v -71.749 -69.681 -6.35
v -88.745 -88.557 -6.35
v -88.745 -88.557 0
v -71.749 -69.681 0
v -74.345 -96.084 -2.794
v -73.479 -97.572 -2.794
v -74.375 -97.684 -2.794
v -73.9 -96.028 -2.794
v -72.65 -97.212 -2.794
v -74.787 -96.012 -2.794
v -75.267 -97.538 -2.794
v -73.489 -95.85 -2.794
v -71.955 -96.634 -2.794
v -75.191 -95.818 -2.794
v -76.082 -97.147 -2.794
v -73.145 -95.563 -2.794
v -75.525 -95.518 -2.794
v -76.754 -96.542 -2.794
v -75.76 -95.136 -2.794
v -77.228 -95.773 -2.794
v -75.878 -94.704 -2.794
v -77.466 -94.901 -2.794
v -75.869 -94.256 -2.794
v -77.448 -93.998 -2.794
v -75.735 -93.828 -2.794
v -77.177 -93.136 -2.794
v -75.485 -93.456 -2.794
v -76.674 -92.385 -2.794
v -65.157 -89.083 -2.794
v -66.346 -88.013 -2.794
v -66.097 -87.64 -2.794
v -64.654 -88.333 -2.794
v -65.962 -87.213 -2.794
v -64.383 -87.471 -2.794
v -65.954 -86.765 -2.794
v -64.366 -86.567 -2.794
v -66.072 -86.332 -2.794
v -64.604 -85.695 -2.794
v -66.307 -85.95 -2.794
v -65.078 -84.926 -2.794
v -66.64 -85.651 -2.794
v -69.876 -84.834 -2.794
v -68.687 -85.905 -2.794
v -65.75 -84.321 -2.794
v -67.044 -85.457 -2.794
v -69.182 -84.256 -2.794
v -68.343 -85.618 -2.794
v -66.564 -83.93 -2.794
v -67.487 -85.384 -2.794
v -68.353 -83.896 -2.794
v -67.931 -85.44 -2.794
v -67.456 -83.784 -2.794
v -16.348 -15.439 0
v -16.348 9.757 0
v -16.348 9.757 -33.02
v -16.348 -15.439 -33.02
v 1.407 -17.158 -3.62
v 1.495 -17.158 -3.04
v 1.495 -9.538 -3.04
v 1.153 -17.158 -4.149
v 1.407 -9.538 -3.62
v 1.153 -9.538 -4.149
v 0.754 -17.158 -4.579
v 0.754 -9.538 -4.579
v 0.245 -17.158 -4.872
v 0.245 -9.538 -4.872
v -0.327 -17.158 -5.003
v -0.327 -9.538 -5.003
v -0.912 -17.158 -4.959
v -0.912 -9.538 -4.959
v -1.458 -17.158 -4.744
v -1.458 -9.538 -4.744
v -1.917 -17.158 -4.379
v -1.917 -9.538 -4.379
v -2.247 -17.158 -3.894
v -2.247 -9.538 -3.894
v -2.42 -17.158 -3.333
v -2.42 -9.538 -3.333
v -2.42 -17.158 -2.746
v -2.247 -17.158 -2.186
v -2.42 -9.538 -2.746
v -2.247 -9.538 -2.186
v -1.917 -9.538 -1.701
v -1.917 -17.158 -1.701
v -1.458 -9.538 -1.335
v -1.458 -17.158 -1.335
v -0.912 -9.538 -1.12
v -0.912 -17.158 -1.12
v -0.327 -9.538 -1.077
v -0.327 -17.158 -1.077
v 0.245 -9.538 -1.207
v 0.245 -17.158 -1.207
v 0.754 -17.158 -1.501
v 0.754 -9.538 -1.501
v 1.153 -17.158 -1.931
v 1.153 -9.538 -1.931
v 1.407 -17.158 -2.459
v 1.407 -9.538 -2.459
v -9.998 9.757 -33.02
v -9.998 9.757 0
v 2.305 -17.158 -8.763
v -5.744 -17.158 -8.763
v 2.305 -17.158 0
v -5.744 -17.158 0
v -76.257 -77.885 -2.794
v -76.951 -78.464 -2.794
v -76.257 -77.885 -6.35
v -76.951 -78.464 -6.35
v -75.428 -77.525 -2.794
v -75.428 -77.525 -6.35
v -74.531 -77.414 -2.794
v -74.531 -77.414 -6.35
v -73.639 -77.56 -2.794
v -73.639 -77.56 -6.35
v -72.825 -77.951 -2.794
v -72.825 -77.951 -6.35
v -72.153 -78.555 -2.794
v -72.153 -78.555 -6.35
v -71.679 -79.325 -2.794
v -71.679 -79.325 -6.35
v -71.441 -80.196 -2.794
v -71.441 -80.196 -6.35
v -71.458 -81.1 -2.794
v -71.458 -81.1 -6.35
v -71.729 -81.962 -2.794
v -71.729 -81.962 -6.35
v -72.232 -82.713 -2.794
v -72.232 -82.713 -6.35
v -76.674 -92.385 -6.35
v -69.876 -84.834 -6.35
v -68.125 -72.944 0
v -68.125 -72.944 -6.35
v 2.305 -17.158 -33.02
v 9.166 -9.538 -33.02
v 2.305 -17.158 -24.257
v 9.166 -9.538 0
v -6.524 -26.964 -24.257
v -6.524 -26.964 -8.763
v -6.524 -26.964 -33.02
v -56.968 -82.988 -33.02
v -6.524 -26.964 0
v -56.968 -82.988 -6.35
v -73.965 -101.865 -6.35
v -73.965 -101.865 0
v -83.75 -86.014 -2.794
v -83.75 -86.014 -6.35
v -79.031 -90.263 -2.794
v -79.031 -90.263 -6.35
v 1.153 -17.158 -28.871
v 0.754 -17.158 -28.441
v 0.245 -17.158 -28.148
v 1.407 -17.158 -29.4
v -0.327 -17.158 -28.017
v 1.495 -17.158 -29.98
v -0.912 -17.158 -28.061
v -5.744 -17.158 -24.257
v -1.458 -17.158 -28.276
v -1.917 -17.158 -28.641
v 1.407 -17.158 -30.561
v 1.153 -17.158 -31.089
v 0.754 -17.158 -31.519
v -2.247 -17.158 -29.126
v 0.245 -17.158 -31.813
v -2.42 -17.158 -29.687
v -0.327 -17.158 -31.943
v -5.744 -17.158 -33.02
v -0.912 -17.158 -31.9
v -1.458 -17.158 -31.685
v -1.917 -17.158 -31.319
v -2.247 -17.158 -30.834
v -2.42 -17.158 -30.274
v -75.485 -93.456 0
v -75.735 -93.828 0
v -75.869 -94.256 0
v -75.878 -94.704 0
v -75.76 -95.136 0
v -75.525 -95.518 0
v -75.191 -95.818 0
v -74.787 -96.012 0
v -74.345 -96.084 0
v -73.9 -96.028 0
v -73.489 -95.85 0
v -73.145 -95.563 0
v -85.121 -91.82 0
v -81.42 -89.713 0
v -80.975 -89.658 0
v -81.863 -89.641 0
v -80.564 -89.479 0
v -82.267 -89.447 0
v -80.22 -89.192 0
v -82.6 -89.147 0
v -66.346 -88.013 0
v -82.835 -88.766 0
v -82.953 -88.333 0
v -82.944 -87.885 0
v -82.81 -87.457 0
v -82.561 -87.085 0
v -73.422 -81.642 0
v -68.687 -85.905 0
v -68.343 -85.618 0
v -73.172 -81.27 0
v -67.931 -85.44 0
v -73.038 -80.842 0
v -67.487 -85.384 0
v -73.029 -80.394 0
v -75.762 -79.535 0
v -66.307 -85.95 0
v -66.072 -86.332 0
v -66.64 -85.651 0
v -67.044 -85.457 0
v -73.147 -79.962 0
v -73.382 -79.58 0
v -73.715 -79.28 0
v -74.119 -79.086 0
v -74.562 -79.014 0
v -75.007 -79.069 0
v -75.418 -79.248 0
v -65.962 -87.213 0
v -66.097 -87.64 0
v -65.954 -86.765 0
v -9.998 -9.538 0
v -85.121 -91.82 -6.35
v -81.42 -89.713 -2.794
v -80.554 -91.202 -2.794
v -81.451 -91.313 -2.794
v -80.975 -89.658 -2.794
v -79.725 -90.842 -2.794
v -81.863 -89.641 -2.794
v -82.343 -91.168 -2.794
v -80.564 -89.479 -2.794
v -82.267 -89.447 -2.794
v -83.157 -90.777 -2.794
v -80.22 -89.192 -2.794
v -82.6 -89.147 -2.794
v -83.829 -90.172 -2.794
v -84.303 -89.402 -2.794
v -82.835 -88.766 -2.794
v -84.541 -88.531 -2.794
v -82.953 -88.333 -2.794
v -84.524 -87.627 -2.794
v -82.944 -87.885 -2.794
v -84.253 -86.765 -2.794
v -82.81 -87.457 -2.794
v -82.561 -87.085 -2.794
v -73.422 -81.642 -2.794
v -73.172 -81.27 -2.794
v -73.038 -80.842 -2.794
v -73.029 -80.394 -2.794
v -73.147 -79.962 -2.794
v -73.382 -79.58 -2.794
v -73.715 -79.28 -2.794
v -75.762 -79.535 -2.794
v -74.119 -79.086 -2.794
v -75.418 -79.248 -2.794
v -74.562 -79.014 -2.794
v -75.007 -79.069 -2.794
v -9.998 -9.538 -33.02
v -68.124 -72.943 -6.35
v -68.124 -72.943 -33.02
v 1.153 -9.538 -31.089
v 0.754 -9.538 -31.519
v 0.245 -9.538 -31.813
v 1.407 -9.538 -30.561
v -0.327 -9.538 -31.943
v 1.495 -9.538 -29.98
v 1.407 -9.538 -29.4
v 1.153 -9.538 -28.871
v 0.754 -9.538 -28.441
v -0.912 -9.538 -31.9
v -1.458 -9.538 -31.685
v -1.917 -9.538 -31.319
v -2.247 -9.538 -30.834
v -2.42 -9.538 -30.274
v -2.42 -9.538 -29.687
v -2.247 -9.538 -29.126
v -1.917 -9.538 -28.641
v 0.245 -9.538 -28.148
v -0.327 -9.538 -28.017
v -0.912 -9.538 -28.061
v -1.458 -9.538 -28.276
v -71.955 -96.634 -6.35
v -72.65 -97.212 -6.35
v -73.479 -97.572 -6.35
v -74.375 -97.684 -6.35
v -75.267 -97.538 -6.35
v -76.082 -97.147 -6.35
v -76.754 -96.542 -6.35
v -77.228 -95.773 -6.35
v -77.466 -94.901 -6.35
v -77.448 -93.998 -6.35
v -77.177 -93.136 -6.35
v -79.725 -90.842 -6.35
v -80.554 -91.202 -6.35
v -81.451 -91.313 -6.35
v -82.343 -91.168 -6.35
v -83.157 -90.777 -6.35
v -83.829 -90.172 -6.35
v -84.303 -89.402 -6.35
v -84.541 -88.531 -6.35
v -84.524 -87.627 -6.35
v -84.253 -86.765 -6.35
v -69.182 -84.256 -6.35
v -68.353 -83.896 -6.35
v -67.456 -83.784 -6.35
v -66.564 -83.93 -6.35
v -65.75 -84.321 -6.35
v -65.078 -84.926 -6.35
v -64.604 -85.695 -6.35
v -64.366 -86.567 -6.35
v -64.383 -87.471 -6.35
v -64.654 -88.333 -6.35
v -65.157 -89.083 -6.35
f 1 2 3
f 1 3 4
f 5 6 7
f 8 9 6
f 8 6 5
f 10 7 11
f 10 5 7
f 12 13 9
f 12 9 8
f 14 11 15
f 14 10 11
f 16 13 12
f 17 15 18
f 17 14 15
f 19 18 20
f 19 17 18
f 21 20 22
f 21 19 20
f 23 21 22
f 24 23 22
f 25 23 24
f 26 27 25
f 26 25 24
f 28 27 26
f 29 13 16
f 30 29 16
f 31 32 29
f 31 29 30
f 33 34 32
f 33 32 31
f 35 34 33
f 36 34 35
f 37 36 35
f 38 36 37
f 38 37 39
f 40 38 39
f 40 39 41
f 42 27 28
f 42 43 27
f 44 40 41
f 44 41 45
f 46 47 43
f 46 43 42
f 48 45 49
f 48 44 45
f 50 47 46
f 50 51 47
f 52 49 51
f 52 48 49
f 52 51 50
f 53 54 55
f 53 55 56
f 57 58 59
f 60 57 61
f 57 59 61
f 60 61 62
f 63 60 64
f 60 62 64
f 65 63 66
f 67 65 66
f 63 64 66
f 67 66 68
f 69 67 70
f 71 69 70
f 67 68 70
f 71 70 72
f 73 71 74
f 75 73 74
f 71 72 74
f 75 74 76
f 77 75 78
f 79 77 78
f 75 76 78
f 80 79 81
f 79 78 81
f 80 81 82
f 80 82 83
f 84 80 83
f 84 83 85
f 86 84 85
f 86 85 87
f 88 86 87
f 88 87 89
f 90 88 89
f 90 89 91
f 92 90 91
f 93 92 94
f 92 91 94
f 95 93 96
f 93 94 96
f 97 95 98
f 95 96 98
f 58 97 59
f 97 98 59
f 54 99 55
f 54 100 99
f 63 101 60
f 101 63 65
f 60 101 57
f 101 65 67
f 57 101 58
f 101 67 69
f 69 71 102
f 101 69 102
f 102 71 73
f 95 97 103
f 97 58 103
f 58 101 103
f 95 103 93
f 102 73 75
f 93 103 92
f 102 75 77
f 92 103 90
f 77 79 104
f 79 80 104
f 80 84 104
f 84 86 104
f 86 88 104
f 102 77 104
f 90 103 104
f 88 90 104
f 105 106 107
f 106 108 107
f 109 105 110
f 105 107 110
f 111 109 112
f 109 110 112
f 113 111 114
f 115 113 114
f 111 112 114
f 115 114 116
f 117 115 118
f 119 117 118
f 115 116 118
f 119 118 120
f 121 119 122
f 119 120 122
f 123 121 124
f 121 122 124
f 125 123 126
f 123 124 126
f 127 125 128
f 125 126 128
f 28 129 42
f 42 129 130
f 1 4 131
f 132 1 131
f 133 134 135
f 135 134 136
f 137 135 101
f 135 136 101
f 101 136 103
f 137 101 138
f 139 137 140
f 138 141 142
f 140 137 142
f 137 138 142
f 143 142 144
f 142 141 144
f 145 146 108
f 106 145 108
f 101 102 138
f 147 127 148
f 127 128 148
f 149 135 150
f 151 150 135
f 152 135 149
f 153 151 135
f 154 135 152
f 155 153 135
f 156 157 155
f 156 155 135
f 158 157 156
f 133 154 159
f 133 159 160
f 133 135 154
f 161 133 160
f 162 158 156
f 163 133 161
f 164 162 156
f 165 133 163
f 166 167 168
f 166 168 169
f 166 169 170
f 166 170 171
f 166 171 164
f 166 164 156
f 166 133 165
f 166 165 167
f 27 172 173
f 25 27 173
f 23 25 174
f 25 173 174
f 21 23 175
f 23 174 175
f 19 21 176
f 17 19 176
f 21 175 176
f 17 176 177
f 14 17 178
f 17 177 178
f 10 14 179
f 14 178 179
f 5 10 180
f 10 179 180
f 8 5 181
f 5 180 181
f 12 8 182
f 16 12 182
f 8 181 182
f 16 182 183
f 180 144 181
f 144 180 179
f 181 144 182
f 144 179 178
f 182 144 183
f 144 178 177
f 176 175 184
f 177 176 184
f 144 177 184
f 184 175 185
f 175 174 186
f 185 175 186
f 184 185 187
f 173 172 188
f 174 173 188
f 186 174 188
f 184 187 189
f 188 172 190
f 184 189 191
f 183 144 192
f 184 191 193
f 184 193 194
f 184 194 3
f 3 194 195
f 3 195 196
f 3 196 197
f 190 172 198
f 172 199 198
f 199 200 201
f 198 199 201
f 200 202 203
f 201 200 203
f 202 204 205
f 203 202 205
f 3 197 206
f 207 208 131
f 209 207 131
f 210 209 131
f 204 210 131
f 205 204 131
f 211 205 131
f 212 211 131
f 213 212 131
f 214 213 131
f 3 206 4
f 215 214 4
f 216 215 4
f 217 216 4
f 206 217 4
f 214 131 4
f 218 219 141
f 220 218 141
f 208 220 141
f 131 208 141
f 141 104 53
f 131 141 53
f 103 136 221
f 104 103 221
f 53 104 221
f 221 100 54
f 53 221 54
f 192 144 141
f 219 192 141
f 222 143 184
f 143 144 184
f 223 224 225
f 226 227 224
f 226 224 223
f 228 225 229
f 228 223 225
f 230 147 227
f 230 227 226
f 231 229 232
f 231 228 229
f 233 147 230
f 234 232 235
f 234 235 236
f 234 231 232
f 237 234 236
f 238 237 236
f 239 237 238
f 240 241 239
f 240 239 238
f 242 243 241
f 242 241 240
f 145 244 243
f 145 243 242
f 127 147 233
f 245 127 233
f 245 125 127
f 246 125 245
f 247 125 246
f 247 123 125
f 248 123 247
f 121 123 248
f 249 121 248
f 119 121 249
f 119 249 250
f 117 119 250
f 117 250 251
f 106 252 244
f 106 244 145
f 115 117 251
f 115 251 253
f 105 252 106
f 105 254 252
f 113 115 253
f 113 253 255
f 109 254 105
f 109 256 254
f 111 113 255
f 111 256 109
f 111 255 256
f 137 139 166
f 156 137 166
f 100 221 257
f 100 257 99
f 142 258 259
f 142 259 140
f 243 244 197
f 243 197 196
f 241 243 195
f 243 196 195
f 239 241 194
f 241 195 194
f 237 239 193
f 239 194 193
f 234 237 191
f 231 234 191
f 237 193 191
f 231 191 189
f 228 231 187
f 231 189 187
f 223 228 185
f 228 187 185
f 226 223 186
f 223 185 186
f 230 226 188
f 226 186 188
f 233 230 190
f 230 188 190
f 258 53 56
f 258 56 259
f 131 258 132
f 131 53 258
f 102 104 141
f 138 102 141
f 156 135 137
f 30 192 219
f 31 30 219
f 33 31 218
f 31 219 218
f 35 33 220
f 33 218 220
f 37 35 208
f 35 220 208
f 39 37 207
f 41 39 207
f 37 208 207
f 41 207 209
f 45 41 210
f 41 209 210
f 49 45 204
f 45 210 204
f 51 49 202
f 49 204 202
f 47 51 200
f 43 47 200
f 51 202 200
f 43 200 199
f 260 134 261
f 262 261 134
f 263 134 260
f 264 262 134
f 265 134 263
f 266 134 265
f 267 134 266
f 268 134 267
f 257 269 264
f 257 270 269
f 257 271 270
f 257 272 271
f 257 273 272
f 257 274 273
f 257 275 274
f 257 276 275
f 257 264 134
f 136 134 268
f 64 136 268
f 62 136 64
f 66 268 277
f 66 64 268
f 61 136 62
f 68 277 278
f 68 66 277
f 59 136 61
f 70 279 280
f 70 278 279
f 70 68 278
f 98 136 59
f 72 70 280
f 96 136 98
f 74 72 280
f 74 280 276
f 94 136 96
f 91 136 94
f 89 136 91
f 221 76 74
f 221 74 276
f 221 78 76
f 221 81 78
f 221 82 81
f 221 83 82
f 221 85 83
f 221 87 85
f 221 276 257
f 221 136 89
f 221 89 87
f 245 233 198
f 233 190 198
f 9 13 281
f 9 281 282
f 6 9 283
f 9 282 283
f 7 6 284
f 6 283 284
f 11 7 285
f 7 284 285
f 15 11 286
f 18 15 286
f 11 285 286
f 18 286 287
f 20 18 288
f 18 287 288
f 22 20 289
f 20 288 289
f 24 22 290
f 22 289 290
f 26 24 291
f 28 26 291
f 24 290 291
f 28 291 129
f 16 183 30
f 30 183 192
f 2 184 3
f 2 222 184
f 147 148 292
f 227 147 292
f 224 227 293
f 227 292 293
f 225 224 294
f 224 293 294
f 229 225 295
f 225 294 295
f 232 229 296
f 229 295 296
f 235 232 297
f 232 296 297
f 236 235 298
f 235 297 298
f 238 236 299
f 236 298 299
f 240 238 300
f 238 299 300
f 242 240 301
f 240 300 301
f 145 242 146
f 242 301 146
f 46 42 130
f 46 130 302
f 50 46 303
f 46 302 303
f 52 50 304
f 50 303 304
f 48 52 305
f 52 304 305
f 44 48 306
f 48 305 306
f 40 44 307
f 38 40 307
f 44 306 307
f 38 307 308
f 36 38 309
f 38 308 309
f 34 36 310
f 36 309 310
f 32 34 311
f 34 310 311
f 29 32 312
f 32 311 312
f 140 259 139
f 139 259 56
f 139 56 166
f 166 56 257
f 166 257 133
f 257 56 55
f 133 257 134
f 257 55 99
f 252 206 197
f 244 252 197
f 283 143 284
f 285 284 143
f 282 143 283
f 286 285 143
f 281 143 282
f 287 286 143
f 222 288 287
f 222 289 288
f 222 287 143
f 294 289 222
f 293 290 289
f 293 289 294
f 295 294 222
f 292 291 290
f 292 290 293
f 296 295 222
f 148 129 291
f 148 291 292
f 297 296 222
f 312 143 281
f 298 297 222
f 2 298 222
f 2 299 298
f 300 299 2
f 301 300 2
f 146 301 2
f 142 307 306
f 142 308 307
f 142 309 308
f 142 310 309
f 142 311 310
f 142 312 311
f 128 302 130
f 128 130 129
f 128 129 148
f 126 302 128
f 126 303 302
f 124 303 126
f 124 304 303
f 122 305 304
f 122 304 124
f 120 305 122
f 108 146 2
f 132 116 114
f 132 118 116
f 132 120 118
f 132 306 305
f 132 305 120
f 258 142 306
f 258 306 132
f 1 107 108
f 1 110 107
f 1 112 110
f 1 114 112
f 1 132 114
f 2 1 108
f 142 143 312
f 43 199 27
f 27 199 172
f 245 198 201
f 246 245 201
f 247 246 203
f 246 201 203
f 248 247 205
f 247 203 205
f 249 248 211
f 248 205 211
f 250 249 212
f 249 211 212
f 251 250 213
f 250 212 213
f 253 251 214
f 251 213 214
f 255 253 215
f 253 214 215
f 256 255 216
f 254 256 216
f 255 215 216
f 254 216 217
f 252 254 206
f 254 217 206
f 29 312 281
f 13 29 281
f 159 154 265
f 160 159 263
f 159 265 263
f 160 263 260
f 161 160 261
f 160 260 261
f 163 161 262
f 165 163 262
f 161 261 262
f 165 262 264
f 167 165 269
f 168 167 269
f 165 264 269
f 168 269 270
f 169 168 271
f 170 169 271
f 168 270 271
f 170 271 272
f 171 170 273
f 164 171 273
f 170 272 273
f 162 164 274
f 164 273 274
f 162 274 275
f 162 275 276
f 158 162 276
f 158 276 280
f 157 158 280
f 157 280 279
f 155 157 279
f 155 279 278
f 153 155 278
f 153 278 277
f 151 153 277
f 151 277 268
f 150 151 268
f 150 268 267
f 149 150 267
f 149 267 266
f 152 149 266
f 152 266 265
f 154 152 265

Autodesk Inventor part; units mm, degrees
ref_plane "YZ Plane" through (0, 0, 0) normal (1, 0, 0) x (0, 1, 0)
ref_plane "XZ Plane" through (0, 0, 0) normal (0, 1, 0) x (-1, 0, 0)
ref_plane "Work Plane1" through (0, 0, 0) normal (0, 0, 1) x (1, 0, 0)
sketch "Sketch1" plane through (0, 0, 0) normal (0, 0, 1) x (1, 0, 0)
  line L0 (4.129202, -9.5377) -> (6.406797, -9.5377) construction
  line L1 (9.525, -8.41296) -> (9.525, -7.435497) construction
  line L2 (-6.406797, 9.5123) -> (-4.129202, 9.5123) construction
  line L3 (-9.525, 4.116502) -> (-9.525, 6.394097) construction
  line L4 (9.314549, -9.373063) -> (-73.965447, -101.864868) construction
  line L5 (9.166309, -9.5377) -> (-73.965447, -101.864868)
  line L6 (-73.965447, -101.864868) -> (-85.121243, -91.820144)
  line L7 (6.33881, 9.756536) -> (-85.121243, -91.820144) construction
  line L8 (9.166309, -9.5377) -> (-9.997679, -9.5377)
  line L9 (-9.997679, -9.5377) -> (-9.997679, 9.756536)
  line L10 (-9.997679, 9.756536) -> (-16.347679, 9.756536)
  line L11 (-16.347679, 9.756536) -> (-16.347679, -15.439362)
  line L12 (-16.347679, -15.439362) -> (-85.121243, -91.820144)
  point P0 (0, 0)
  dimension "d0" = 124.46
  dimension "d1" = 48
  dimension "d5" = 6.35
ref_plane "Work Plane2" through (-4.445, -9.144, -33.02) normal (0, 0, -1) x (0, 1, 0)
extrude "Extrusion1" add sketch "Sketch1" against normal up to surface (33.02 mm away)
sketch "Sketch2" plane through (-73.965447, -101.864868, -33.02) normal (-0.6691306, -0.7431448, 0) x (0.7431448, -0.6691306, 0)
  line L0 (0, 33.02) -> (0, 0)
  line L1 (-15.011605, 33.02) -> (-15.011605, 0)
  line L2 (0, 0) -> (-15.011605, 0)
  line L3 (-15.011605, 0) -> (-15.011605, 26.67)
  line L4 (-15.011605, 26.67) -> (0, 26.67)
  line L5 (0, 26.67) -> (0, 0)
  line L6 (-15.011605, 33.02) -> (0, 33.02)
  point P0 (-13.193862, 33.02)
  dimension "d19" = 6.35
extrude "Extrusion2" cut sketch "Sketch2" against normal blind 25.4 contours L0 L2 L1 L4
sketch "Sketch3" plane through (-73.965447, -101.864868, -6.35) normal (0, 0, -1) x (-0.7431448, 0.6691306, 0)
  line L0 (19.8882, 12.0904) -> (19.8882, 3.175) construction
  line L1 (0, 25.4) -> (15.011605, 25.4) construction
  line L2 (15.011605, 0) -> (0, 0) construction
  line L3 (0, 0) -> (19.8882, 0) construction
  line L4 (19.8882, 0) -> (19.8882, 25.4) construction
  line L5 (19.8882, 25.4) -> (0, 25.4) construction
  line L6 (0, 25.4) -> (0, 0) construction
  line L7 (15.011605, 0) -> (19.8882, 0)
  line L8 (19.8882, 0) -> (19.8882, 25.4)
  line L9 (19.8882, 25.4) -> (15.011605, 25.4)
  line L10 (15.011605, 25.4) -> (15.011605, 0)
  point P0 (13.193862, 125.192894)
extrude "Extrusion3" add sketch "Sketch3" against normal up to surface (6.35 mm away)
sketch "Sketch4" plane through (0, 0, 0) normal (0, 0, 1) x (1, 0, 0)
  line L0 (-88.74526, -88.557064) -> (-71.749342, -69.681186) construction
  line L1 (-73.965447, -101.864868) -> (9.166309, -9.5377) construction
  line L2 (-74.314967, -94.50927) -> (-67.5166, -86.958918) construction
  line L3 (-73.965447, -101.864868) -> (-56.969529, -82.988989) construction
  line L4 (-73.965447, -101.864868) -> (-88.74526, -88.557064) construction
  line L5 (-81.390199, -88.138702) -> (-74.591832, -80.588351) construction
  line L6 (-74.314967, -94.50927) -> (-67.5166, -86.958918) construction
  line L7 (-73.144662, -95.563017) -> (-66.346296, -88.012665)
  line L8 (-68.686904, -85.905171) -> (-75.485271, -93.455523)
  arc A0 (-75.485271, -93.455523) -> (-73.144662, -95.563017) centre (-74.314967, -94.50927) ccw
  arc A1 (-66.346296, -88.012665) -> (-68.686904, -85.905171) centre (-67.5166, -86.958918) ccw
  line L9 (-81.390199, -88.138702) -> (-74.591832, -80.588351) construction
  line L10 (-80.219894, -89.192449) -> (-73.421527, -81.642098)
  line L11 (-75.762136, -79.534604) -> (-82.560503, -87.084955)
  arc A2 (-82.560503, -87.084955) -> (-80.219894, -89.192449) centre (-81.390199, -88.138702) ccw
  arc A3 (-73.421527, -81.642098) -> (-75.762136, -79.534604) centre (-74.591832, -80.588351) ccw
  point P0 (0, 0)
  point P1 (-70.915783, -90.734094)
  point P2 (-77.991015, -84.363527)
  dimension "d37" = 10.16
  dimension "d38" = 5.1816
  dimension "d39" = 5.2324
  dimension "d40" = 9.52066
  dimension "d41" = 3.1496
  dimension "d42" = 3.1496
extrude "Extrusion4" cut sketch "Sketch4" against normal through all
sketch "Sketch6" plane through (-9.997679, -9.5377, 0) normal (0, 1, 0) x (1, 0, 0)
  arc A0 (9.506526, 4.79213) -> (10.740649, 4.300966) centre (9.523849, 3.039616) ccw construction
  arc A1 (9.506526, 31.732899) -> (10.740649, 31.241734) centre (9.523849, 29.980384) ccw construction
  circle A2 centre (9.523849, 29.980384) radius 1.9685
  circle A3 centre (9.523849, 3.039616) radius 1.9685
  point P0 (9.997679, 0)
  dimension "d24" = 3.937
  dimension "d25" = 3.937
extrude "Extrusion6" cut sketch "Sketch6" against normal through all
sketch "Sketch7" plane through (9.166309, -9.5377, 0) normal (0.7431448, -0.6691306, 0) x (0, 0, -1)
  line L0 (33.02, -98.838459) -> (33.02, 0) construction
  line L1 (33.02, -9.525) -> (0, -9.525) construction
  point P0 (0, 0.954435)
sketch "Sketch8" plane through (9.166309, -9.5377, -33.02) normal (0, 0, -1) x (-1, 0, 0)
  line L0 (11.608639, 0) -> (11.608639, -12.892699) construction
  line L1 (66.135838, -73.451289) -> (0, 0) construction
  line L2 (11.608639, -7.62) -> (6.861079, -7.62) construction
  line L3 (0, 0) -> (19.163987, 0) construction
  line L4 (7.671639, 0) -> (7.671639, -8.520218) construction
  line L5 (14.910639, 0) -> (14.910639, -14.251905) construction
  line L6 (6.861079, -7.62) -> (14.910639, -7.62)
  line L7 (83.131755, -92.327168) -> (0, 0)
  line L8 (15.69062, -17.426199) -> (6.861079, -7.62)
  line L9 (15.69062, -17.426199) -> (14.910639, -7.62)
  point P0 (9.166309, 9.5377)
  dimension "d28" = 7.62
  dimension "d29" = 3.302
extrude "Extrusion7" cut sketch "Sketch8" against normal blind 8.763
sketch "Sketch9" plane through (0, 0, 0) normal (0, 0, 1) x (1, 0, 0)
  line L0 (2.30523, -17.1577) -> (-5.74433, -17.1577) construction
  line L1 (-5.74433, -17.1577) -> (-6.524312, -26.963899) construction
  line L2 (2.30523, -17.1577) -> (-6.524312, -26.963899)
  line L3 (-73.965447, -101.864868) -> (9.166309, -9.5377)
  line L4 (2.30523, -17.1577) -> (-5.74433, -17.1577)
  line L5 (-5.2705, -26.963899) -> (-5.2705, -17.1577)
  point P0 (0, 0)
sketch "Sketch9 outline for Extrusion8" plane through (0, 0, 0) normal (0, 0, 1) x (1, 0, 0)
  line L0 (-6.524312, -26.963899) -> (2.30523, -17.1577)
  line L1 (-5.74433, -17.1577) -> (-6.524312, -26.963899)
  line L2 (2.30523, -17.1577) -> (-5.74433, -17.1577)
extrude "Extrusion8" cut sketch "Sketch9 outline for Extrusion8" against normal blind 8.763
sketch "Sketch10" plane through (9.166309, -9.5377, -33.02) normal (0, 0, -1) x (-1, 0, 0)
  line L0 (25.513987, -5.901662) -> (77.291634, -63.406565)
  line L1 (51.797758, -35.092747) -> (40.641962, -45.137471)
  line L2 (66.135838, -73.451289) -> (15.69062, -17.426199) construction
  line L3 (40.913229, -45.438744) -> (36.5125, -40.551239) construction
  line L4 (66.135838, -73.451289) -> (77.291634, -63.406565) construction
  point P0 (9.166309, 9.5377)
  dimension "d34" = 38.1
sketch "Sketch11" plane through (-73.965447, -101.864868, -6.35) normal (0, 0, -1) x (-0.7431448, 0.6691306, 0)
  arc A0 (3.6068, 5.2324) -> (6.7564, 5.2324) centre (5.1816, 5.2324) ccw construction
  arc A1 (6.7564, 15.3924) -> (3.6068, 15.3924) centre (5.1816, 15.3924) ccw construction
  line L0 (5.1816, 5.2324) -> (5.1816, 15.3924) construction
  arc A2 (13.127463, 5.2324) -> (16.277063, 5.2324) centre (14.702263, 5.2324) ccw construction
  arc A3 (16.277063, 15.3924) -> (13.127463, 15.3924) centre (14.702263, 15.3924) ccw construction
  line L1 (14.702263, 5.2324) -> (14.702263, 15.3924) construction
  line L2 (14.702263, 5.2324) -> (14.702263, 15.3924) construction
  line L3 (17.877263, 5.2324) -> (17.877263, 15.3924)
  line L4 (11.527263, 15.3924) -> (11.527263, 5.2324)
  arc A4 (11.527263, 5.2324) -> (17.877263, 5.2324) centre (14.702263, 5.2324) ccw
  arc A5 (17.877263, 15.3924) -> (11.527263, 15.3924) centre (14.702263, 15.3924) ccw
  line L5 (5.1816, 5.2324) -> (5.1816, 15.3924) construction
  line L6 (8.3566, 5.2324) -> (8.3566, 15.3924)
  line L7 (2.0066, 15.3924) -> (2.0066, 5.2324)
  arc A6 (2.0066, 5.2324) -> (8.3566, 5.2324) centre (5.1816, 5.2324) ccw
  arc A7 (8.3566, 15.3924) -> (2.0066, 15.3924) centre (5.1816, 15.3924) ccw
  point P0 (13.193862, 125.192894)
  point P1 (14.702263, 10.3124)
  point P2 (5.1816, 10.3124)
  dimension "d43" = 6.35
  dimension "d44" = 6.35
extrude "Extrusion9" cut sketch "Sketch11" against normal blind 3.556
properties part number "arm stop 48 degree whole"
